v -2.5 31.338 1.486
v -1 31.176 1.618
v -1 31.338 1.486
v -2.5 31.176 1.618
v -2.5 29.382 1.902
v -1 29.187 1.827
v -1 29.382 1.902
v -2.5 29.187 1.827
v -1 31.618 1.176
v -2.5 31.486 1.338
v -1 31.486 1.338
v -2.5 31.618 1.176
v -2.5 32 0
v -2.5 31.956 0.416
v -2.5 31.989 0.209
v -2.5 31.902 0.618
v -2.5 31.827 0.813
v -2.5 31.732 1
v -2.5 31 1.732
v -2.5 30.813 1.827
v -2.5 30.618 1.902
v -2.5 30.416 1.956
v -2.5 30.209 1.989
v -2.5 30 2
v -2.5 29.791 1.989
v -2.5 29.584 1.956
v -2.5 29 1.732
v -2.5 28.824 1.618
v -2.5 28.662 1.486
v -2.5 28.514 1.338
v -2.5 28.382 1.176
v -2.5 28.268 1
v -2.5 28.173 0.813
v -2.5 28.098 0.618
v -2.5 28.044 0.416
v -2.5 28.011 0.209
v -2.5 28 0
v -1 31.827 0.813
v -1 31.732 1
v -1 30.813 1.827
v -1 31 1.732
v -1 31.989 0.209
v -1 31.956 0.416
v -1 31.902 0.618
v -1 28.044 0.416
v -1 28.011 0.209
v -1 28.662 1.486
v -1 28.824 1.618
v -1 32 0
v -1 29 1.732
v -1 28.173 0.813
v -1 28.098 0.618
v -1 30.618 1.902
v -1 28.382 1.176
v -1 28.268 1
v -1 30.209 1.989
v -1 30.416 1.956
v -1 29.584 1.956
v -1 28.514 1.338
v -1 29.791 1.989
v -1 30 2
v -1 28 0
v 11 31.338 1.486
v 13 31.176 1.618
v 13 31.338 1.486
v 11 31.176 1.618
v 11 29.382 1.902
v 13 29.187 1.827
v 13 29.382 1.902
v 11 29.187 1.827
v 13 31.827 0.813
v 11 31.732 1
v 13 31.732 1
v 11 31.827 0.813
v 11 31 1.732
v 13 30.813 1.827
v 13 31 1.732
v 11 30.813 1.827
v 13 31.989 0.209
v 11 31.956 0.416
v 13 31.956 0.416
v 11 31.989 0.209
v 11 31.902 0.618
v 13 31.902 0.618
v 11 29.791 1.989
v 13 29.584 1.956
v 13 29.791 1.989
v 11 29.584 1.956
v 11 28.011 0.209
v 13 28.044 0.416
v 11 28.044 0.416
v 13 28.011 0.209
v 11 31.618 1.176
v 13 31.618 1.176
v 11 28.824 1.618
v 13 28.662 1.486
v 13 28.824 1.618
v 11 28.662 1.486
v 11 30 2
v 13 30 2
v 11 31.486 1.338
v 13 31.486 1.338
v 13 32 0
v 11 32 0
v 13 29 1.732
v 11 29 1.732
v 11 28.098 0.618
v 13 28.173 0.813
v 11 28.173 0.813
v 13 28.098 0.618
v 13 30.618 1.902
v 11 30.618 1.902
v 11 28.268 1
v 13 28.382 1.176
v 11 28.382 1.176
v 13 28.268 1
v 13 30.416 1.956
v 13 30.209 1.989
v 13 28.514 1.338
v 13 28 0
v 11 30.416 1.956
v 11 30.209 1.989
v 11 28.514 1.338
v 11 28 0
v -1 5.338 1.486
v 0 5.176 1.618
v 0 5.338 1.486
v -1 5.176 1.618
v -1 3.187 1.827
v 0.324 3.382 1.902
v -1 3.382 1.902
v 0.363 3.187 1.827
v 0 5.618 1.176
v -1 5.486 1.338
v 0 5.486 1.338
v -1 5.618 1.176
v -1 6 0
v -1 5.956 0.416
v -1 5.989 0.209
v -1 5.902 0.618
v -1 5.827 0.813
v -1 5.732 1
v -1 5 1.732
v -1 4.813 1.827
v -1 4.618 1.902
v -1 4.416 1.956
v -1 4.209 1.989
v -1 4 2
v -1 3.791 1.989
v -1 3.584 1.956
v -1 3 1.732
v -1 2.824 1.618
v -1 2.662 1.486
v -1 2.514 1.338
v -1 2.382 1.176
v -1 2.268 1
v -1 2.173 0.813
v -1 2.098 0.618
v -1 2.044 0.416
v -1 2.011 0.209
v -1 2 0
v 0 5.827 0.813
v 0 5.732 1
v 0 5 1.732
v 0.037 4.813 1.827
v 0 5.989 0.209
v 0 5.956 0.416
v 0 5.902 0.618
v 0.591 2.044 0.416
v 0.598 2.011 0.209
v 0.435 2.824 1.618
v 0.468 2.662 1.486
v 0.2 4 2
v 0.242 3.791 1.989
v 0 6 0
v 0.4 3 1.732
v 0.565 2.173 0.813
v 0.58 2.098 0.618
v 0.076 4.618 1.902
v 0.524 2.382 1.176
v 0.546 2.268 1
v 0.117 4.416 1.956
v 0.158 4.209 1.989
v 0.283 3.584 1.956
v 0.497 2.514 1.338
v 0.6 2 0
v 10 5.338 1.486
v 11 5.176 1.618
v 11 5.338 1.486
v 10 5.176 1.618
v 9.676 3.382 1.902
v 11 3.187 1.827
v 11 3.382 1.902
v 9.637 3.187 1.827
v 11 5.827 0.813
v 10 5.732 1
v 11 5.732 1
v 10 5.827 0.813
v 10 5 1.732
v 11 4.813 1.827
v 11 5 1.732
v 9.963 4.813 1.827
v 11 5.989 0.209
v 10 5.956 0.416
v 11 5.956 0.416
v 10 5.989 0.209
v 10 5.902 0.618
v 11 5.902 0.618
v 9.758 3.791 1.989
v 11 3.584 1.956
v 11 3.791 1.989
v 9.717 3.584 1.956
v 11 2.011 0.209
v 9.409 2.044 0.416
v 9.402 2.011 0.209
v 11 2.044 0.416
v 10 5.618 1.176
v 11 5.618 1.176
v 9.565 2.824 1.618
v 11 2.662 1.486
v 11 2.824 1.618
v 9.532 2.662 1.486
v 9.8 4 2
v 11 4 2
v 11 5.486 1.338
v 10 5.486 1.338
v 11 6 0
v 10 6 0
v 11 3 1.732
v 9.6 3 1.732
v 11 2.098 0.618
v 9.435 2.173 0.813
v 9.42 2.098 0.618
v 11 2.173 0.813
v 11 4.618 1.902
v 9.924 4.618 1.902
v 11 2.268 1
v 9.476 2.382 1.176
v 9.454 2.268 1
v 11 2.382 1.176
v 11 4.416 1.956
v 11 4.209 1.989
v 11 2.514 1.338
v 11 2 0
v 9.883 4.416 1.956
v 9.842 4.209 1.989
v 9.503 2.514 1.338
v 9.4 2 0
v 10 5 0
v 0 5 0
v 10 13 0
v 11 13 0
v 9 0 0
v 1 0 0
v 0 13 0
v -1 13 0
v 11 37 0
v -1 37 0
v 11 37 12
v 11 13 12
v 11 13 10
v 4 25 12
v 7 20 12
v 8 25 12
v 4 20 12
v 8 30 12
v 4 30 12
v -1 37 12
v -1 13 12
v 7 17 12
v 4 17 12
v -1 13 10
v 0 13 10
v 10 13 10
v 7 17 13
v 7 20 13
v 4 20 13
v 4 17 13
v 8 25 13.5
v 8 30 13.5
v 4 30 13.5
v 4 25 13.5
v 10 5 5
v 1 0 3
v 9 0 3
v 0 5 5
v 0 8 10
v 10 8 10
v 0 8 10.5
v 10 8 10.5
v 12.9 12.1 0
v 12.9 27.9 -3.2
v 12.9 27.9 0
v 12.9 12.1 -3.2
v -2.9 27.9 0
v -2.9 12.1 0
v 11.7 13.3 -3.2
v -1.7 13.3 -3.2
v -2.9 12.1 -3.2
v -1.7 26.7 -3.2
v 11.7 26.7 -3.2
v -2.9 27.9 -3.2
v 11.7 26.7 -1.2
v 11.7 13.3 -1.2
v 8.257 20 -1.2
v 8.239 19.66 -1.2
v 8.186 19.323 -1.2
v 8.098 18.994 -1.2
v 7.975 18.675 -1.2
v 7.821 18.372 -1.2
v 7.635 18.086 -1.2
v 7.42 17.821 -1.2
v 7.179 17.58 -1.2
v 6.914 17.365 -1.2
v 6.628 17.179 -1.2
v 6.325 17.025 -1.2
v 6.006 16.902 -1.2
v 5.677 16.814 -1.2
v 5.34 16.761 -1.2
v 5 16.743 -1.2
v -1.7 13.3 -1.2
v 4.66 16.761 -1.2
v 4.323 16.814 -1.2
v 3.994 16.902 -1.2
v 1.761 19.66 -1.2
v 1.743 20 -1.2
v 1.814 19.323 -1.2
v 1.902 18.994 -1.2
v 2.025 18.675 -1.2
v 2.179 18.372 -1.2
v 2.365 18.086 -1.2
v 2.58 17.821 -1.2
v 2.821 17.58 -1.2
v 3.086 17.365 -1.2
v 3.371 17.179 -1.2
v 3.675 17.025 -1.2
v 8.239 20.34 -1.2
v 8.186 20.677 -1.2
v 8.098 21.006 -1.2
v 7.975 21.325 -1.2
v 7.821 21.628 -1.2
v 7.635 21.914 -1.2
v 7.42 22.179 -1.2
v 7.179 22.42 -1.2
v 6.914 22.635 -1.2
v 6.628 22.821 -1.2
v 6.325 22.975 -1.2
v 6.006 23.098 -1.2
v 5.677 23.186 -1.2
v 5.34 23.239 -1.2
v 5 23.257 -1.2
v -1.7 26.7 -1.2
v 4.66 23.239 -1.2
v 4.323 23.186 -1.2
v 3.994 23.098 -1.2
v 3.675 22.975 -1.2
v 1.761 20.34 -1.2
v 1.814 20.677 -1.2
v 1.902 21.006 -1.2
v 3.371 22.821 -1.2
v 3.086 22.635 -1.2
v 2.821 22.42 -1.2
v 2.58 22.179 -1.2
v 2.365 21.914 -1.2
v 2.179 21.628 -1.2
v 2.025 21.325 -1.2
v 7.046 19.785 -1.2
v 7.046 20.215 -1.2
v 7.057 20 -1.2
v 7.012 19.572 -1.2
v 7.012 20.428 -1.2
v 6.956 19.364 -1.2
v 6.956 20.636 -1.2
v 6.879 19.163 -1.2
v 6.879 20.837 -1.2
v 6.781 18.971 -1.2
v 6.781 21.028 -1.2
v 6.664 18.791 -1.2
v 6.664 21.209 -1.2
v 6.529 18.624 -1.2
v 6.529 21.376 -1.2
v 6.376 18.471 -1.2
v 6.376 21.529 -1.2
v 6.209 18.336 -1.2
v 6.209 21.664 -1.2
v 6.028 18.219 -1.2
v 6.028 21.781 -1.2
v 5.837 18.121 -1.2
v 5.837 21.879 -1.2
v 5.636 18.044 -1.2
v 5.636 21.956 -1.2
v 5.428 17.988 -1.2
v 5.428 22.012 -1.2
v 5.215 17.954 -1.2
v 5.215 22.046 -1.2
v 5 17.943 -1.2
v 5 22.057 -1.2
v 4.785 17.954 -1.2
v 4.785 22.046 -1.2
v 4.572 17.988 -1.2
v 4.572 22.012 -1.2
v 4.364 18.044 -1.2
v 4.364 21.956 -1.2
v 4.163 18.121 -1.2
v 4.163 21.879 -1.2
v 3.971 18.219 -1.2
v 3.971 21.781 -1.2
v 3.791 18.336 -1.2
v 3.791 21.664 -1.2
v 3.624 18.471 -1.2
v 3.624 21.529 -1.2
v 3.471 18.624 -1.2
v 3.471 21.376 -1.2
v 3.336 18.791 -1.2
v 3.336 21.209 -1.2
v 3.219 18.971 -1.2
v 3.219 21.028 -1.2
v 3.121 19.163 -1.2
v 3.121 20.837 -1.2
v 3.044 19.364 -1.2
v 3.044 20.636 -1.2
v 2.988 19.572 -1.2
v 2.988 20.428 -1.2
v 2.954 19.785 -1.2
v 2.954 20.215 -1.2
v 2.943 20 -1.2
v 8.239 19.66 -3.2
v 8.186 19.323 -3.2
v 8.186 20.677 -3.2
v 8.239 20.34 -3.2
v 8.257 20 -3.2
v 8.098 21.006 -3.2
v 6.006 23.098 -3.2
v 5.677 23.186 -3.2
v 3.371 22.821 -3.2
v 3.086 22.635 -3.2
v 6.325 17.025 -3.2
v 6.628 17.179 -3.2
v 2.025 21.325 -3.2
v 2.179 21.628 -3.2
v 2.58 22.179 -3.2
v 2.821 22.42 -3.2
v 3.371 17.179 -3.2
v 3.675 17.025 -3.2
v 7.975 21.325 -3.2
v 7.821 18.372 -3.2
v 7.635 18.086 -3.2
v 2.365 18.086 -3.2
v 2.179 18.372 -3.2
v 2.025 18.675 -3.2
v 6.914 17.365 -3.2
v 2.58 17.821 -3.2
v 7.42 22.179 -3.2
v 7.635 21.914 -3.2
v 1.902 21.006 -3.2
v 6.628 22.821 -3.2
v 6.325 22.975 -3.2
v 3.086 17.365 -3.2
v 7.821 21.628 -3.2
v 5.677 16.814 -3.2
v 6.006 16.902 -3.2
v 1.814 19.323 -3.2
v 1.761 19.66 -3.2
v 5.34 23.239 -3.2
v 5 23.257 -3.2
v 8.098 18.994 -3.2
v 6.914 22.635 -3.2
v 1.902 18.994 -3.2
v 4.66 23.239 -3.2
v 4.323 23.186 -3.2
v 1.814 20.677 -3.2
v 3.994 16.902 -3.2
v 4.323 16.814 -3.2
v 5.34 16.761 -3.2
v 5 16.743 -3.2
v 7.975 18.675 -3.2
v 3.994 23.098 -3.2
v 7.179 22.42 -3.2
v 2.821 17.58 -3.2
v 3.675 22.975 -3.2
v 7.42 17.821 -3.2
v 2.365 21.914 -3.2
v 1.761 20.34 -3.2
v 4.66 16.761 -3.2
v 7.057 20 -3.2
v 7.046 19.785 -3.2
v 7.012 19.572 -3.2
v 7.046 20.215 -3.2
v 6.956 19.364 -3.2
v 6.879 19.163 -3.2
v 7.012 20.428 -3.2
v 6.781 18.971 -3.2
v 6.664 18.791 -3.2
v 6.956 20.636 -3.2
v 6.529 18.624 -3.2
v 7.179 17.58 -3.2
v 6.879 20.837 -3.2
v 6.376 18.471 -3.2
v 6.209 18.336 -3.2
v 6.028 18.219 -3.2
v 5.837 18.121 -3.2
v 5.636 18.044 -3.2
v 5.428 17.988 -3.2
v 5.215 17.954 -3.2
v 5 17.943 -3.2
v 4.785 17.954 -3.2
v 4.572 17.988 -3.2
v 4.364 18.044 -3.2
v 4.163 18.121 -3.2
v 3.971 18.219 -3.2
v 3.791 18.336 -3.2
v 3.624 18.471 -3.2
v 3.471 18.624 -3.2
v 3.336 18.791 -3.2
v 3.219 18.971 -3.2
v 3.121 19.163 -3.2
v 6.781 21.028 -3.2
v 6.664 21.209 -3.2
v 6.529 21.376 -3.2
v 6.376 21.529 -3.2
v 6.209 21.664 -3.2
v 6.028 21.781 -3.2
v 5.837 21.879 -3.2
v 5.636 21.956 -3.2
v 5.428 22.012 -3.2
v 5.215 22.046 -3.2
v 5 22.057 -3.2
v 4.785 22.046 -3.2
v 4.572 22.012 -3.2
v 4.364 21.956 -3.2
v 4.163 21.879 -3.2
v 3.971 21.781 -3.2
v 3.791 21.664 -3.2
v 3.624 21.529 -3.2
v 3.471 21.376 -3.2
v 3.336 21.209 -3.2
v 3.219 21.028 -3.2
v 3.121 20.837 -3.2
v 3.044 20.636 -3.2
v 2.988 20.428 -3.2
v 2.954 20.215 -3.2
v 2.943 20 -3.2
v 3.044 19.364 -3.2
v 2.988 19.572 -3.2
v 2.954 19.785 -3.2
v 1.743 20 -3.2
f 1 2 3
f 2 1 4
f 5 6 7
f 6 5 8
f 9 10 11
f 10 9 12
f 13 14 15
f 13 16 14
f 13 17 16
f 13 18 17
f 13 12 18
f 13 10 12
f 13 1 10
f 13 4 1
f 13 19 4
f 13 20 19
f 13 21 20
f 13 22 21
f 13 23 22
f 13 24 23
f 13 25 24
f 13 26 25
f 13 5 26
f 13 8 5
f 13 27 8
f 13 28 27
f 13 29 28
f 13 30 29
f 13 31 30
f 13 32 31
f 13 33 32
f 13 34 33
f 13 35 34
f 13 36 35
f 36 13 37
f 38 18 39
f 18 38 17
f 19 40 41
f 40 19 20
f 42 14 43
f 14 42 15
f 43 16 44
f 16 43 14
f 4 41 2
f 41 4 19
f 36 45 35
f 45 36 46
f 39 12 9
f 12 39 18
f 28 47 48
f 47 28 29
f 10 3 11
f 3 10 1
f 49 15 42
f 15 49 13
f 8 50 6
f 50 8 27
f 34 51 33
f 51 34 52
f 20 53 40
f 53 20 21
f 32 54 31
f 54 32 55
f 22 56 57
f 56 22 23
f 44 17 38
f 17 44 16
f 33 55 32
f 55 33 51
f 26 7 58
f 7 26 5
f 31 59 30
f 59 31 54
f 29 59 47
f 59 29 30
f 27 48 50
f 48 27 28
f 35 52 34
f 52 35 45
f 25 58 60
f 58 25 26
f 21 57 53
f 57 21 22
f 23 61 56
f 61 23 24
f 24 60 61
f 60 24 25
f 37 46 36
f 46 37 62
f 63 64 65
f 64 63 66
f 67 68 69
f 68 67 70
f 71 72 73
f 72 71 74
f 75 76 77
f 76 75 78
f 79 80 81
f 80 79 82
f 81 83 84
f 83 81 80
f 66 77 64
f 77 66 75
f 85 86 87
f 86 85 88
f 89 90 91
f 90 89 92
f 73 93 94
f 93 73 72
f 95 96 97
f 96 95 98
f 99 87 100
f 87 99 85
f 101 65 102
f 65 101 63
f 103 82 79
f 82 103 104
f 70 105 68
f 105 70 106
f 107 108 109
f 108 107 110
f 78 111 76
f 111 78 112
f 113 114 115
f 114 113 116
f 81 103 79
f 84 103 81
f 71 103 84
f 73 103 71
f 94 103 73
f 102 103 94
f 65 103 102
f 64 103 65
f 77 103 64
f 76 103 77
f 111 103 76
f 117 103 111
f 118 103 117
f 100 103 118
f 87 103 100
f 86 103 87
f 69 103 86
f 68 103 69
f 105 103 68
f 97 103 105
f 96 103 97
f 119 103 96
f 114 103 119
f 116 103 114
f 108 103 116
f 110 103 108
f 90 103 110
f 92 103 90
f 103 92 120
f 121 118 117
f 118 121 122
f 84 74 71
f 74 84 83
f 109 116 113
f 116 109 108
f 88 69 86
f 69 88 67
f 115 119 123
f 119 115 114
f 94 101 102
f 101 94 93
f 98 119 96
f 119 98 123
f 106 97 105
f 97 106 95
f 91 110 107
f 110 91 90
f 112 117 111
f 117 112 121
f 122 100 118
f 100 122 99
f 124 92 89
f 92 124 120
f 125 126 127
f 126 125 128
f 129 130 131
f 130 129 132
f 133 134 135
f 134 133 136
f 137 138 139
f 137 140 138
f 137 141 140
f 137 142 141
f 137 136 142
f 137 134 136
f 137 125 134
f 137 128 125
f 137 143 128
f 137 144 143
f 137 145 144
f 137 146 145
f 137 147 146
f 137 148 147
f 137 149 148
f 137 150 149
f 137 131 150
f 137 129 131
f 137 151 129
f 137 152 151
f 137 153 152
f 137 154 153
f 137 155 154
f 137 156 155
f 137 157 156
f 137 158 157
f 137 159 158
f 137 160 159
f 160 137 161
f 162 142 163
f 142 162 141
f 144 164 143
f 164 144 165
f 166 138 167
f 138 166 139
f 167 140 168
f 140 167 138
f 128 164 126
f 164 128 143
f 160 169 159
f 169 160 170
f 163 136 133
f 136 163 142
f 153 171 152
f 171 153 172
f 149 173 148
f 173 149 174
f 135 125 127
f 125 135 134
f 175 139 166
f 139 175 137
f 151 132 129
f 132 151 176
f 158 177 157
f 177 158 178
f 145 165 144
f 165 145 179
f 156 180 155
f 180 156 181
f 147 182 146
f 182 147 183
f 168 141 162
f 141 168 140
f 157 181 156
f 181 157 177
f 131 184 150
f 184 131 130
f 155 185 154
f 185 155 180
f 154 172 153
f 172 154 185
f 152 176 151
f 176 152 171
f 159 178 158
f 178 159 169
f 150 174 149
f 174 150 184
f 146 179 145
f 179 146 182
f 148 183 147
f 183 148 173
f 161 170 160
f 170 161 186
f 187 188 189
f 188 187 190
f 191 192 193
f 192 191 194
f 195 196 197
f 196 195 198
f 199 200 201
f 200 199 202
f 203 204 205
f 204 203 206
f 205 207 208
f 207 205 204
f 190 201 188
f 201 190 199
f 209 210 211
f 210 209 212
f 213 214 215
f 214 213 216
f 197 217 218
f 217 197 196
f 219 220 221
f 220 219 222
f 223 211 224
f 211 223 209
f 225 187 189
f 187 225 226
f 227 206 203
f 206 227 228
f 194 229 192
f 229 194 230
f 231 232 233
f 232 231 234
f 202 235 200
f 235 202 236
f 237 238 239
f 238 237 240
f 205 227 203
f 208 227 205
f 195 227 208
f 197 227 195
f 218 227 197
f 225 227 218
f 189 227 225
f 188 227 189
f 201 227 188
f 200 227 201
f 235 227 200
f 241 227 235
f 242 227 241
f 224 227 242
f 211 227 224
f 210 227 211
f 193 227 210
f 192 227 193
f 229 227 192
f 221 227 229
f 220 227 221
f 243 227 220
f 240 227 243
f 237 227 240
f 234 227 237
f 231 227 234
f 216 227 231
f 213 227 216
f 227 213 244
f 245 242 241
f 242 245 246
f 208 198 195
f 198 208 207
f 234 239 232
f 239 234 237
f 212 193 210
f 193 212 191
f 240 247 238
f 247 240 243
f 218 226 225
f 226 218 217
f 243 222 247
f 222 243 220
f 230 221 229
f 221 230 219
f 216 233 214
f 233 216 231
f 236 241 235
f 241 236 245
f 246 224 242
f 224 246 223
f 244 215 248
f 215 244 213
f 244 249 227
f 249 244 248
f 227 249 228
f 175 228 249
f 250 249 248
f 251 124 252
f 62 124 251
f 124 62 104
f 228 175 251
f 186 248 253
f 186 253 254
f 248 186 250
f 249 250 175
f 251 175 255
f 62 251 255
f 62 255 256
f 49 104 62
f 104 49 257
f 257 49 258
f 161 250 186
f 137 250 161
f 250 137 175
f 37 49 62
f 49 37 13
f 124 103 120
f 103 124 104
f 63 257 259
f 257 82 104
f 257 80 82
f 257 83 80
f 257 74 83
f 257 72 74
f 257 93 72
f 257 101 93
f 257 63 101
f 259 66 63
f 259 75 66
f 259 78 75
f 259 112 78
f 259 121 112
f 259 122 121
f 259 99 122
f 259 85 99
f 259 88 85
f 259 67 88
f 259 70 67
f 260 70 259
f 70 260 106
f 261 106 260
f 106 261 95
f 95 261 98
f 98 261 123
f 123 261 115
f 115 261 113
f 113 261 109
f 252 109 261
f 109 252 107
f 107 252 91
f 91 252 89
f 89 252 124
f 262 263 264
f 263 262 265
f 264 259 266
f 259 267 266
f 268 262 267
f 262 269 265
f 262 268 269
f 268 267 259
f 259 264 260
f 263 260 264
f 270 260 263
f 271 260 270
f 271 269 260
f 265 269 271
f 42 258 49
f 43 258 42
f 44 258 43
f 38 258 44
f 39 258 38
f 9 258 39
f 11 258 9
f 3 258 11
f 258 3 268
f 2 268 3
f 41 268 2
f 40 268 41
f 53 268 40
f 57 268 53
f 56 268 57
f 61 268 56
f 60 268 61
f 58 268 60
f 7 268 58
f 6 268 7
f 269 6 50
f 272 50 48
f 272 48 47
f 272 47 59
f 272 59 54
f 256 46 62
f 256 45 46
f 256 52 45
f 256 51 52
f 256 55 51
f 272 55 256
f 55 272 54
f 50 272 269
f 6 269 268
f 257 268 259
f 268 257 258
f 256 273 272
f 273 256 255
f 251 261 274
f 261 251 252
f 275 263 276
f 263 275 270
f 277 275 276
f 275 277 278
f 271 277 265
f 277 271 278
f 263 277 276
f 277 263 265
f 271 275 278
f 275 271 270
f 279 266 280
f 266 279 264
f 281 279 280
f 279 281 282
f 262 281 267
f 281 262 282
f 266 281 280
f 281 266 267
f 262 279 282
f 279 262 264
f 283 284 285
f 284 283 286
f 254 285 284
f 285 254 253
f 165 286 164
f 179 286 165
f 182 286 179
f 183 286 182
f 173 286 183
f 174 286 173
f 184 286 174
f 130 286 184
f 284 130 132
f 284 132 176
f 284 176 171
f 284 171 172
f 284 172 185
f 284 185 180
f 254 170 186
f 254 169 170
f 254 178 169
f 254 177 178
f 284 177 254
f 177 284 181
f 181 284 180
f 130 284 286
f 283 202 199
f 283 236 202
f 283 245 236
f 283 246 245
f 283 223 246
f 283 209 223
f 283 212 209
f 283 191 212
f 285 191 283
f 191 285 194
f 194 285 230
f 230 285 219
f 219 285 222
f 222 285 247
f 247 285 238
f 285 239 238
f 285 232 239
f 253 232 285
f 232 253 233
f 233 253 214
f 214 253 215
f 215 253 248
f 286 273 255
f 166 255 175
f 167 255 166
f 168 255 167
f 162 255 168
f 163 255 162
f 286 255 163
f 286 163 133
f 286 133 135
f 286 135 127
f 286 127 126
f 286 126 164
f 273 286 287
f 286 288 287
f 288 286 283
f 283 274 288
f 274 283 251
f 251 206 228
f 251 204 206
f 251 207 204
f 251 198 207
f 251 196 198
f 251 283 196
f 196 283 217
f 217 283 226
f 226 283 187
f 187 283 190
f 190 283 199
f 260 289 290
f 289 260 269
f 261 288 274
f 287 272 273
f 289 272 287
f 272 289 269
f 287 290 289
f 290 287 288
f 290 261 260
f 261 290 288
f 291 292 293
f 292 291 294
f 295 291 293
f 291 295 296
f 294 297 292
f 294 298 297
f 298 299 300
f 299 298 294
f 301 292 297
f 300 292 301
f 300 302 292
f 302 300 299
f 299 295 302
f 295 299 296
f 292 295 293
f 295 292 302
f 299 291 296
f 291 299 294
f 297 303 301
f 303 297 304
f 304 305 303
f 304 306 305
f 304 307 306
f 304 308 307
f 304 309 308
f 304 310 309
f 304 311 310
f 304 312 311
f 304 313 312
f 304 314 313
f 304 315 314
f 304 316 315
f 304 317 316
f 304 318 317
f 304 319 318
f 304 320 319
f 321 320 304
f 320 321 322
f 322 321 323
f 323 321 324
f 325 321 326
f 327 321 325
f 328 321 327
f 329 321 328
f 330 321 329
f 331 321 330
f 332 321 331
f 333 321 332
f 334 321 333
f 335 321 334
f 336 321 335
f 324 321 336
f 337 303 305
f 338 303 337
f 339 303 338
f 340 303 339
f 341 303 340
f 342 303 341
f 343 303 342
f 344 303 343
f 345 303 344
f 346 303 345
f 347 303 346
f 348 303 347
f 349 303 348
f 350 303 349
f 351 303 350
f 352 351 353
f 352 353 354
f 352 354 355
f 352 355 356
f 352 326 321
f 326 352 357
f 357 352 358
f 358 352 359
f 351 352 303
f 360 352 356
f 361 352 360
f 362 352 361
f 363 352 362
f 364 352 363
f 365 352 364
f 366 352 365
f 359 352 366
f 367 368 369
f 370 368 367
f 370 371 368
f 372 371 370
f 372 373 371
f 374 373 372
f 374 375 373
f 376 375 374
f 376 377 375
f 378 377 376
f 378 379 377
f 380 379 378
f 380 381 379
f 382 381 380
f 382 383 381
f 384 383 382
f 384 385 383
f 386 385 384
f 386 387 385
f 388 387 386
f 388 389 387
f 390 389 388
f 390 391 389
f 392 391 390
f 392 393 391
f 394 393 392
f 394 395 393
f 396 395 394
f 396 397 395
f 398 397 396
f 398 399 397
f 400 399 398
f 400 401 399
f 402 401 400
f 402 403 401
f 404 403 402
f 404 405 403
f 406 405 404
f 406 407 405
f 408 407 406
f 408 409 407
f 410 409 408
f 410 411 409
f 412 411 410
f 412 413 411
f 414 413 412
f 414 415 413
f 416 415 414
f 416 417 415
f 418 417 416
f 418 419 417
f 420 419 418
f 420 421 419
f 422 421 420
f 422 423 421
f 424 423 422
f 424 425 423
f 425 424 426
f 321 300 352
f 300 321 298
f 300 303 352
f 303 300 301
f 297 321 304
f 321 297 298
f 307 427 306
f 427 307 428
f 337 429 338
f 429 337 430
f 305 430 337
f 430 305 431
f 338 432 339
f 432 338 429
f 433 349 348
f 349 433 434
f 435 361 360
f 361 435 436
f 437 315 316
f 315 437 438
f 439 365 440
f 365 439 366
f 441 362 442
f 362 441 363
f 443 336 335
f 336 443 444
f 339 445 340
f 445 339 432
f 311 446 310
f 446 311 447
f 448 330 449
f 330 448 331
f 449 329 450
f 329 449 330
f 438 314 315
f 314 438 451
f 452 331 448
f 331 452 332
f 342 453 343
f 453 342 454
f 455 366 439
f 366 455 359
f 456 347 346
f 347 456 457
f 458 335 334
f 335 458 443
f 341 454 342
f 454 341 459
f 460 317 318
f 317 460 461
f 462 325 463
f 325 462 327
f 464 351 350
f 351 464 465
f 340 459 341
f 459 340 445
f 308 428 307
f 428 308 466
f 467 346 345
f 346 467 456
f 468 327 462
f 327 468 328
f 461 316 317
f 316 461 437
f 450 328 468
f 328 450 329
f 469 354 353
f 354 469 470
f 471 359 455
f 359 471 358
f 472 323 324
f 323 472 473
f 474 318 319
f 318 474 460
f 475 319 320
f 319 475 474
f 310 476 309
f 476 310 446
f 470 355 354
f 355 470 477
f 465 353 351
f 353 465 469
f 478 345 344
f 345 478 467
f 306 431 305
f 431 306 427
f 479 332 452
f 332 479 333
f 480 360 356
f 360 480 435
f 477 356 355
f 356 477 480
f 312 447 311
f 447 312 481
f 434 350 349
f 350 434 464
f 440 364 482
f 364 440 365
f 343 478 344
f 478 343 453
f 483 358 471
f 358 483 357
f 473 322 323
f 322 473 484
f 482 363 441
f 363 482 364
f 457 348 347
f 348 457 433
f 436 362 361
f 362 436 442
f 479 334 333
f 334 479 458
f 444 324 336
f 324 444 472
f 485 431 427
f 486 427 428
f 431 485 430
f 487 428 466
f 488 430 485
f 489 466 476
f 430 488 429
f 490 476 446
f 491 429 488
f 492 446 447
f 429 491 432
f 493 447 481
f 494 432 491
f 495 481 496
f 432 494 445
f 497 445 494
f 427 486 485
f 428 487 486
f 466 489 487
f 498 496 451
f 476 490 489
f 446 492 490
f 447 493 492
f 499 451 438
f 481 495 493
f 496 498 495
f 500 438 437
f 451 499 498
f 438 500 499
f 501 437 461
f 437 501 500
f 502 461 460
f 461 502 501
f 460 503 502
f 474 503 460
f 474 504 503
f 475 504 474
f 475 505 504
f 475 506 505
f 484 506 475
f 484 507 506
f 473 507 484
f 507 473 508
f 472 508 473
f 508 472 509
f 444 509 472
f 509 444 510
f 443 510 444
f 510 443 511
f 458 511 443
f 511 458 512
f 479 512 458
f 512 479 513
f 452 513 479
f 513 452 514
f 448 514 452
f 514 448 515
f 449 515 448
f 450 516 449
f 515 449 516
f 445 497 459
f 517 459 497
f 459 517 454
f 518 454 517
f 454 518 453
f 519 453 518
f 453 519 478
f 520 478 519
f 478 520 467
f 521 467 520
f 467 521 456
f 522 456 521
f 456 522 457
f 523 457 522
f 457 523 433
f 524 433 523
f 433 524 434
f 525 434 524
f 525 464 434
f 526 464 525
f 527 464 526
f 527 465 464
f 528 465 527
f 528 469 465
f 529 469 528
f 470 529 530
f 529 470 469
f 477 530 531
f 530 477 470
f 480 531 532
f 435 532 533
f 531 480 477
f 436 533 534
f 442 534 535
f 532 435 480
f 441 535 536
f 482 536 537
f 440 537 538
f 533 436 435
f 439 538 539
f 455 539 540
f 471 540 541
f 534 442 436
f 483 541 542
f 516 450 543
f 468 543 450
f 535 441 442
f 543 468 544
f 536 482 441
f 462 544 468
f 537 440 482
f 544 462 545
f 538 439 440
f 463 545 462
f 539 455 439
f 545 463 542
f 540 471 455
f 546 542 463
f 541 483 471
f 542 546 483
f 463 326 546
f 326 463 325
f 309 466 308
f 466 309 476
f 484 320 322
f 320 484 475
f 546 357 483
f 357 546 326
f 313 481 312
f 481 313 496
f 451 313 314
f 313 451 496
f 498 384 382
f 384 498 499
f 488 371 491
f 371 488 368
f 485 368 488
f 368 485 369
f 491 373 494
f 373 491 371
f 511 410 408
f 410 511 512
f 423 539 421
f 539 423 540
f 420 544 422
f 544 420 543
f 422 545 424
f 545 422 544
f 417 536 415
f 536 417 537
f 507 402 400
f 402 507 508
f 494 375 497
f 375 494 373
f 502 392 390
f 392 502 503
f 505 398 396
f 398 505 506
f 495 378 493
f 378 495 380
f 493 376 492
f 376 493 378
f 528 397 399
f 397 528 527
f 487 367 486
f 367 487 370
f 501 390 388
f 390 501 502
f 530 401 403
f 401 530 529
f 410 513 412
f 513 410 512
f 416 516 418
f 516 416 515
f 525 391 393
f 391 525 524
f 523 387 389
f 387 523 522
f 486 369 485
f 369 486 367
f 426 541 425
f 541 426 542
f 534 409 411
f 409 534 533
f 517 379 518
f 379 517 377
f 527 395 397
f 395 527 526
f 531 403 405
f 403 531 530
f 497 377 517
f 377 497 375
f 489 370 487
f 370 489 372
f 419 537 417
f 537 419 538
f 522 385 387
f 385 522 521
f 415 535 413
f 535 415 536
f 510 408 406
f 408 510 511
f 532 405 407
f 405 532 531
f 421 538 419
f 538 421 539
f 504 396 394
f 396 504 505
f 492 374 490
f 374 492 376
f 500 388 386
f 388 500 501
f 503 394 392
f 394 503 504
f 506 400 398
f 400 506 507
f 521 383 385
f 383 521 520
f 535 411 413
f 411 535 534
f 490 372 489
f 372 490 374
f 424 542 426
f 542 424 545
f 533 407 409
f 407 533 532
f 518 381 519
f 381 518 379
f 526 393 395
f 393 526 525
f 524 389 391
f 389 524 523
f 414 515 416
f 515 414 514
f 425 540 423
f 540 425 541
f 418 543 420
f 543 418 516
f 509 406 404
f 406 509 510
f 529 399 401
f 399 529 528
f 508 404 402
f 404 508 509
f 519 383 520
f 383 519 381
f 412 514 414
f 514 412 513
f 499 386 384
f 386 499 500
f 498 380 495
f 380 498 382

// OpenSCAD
// file: LegoBase.scad
$fn = 60;
rOuter = 3.257;
rInner = 2.057;
bOuter = 15.8;
bInner = 13.4;
bOuterZ = 3.2;
bInnerZ = 2;

bInnerOffset = (bOuter-bInner)/2;
boxCenter = bOuter/2;


module LegoBase() {
translate([-bOuter/2, -bOuter/2, -bOuterZ])
    {
    difference() {
        cube([bOuter,bOuter,bOuterZ]);
        translate([bInnerOffset,bInnerOffset,0]) cube([bInner,bInner,bInnerZ]);
    };

    difference() {
        translate([boxCenter,boxCenter,0]) cylinder(h=bInnerZ, r=rOuter);
        translate([boxCenter,boxCenter,0]) cylinder(h=bInnerZ, r=rInner);
    };
}
}
// file: module_RV.scad
HoodPoints = [
  [  1,  0,  0 ],  //0
  [ 9,  0,  0 ],  //1
  [ 10,  5,  0 ],  //2
  [  0,  5,  0 ],  //3
  [  1,  0,  3 ],  //4
  [ 9,  0,  3 ],  //5
  [ 10,  5,  5 ],  //6
  [  0,  5,  5 ]]; //7
  
HoodFaces = [
  [0,1,2,3],  // bottom
  [4,5,1,0],  // front
  [7,6,5,4],  // top
  [5,6,2,1],  // right
  [6,7,3,2],  // back
  [7,4,0,3]]; // left
  


CabPoints = [
  [  0,  5,  0 ],  //0
  [ 10,  5,  0 ],  //1
  [ 10,  8,  0 ],  //2
  [  0,  8,  0 ],  //3
  [  0,  5,  5 ],  //4
  [ 10,  5,  5 ],  //5
  [ 10,  8,  10 ],  //6
  [  0,  8,  10 ]]; //7
  
CabFaces = [
  [0,1,2,3],  // bottom
  [4,5,1,0],  // front
  [7,6,5,4],  // top
  [5,6,2,1],  // right
  [6,7,3,2],  // back
  [7,4,0,3]]; // left
  


CoverPoints = [
  [  0,  8,  10 ],  //0
  [ 10,  8,  10 ],  //1
  [ 11,  13,  10 ],  //2
  [  -1,  13,  10 ],  //3
  [  0,  8,  10.5 ],  //4
  [ 10,  8,  10.5 ],  //5
  [ 11,  13,  12 ],  //6
  [  -1,  13,  12 ]]; //7
  
CoverFaces = [
  [0,1,2,3],  // bottom
  [4,5,1,0],  // front
  [7,6,5,4],  // top
  [5,6,2,1],  // right
  [6,7,3,2],  // back
  [7,4,0,3]]; // left

module wheels() {
	translate([-2.5, 30, 0]) rotate([0,90,0]) cylinder(r=2, h=3);
	translate([10, 30, 0]) rotate([0,90,0]) cylinder(r=2, h=3);

	translate([-1, 4, 0]) rotate([0,90,0]) cylinder(r=2, h=3);
	translate([8, 4, 0]) rotate([0,90,0]) cylinder(r=2, h=3);
}

module RV(includeAC) {

	polyhedron( HoodPoints, HoodFaces );
	polyhedron(CabPoints, CabFaces);
	polyhedron(CoverPoints, CoverFaces);

	$fn = 60;
    
    difference() {
        wheels();
        translate([-5,0,-10]) cube([20,40,10]);
    }
	translate([0,8,0]) cube([10,5,10]);

	translate([0,5,0]) {
		translate([-1,8,0]) cube([12,24,12]);
		if(includeAC) translate([(12/2)-(4/2),12,12]) cube([3,3,1]);
		if(includeAC) translate([(12/2)-(4/2),20,12]) cube([4,5,1.5]);
	}
}
// main file
include <module_RV.scad>
include <LegoBase.scad>
RV(true);
translate([5,20,0])
LegoBase();
